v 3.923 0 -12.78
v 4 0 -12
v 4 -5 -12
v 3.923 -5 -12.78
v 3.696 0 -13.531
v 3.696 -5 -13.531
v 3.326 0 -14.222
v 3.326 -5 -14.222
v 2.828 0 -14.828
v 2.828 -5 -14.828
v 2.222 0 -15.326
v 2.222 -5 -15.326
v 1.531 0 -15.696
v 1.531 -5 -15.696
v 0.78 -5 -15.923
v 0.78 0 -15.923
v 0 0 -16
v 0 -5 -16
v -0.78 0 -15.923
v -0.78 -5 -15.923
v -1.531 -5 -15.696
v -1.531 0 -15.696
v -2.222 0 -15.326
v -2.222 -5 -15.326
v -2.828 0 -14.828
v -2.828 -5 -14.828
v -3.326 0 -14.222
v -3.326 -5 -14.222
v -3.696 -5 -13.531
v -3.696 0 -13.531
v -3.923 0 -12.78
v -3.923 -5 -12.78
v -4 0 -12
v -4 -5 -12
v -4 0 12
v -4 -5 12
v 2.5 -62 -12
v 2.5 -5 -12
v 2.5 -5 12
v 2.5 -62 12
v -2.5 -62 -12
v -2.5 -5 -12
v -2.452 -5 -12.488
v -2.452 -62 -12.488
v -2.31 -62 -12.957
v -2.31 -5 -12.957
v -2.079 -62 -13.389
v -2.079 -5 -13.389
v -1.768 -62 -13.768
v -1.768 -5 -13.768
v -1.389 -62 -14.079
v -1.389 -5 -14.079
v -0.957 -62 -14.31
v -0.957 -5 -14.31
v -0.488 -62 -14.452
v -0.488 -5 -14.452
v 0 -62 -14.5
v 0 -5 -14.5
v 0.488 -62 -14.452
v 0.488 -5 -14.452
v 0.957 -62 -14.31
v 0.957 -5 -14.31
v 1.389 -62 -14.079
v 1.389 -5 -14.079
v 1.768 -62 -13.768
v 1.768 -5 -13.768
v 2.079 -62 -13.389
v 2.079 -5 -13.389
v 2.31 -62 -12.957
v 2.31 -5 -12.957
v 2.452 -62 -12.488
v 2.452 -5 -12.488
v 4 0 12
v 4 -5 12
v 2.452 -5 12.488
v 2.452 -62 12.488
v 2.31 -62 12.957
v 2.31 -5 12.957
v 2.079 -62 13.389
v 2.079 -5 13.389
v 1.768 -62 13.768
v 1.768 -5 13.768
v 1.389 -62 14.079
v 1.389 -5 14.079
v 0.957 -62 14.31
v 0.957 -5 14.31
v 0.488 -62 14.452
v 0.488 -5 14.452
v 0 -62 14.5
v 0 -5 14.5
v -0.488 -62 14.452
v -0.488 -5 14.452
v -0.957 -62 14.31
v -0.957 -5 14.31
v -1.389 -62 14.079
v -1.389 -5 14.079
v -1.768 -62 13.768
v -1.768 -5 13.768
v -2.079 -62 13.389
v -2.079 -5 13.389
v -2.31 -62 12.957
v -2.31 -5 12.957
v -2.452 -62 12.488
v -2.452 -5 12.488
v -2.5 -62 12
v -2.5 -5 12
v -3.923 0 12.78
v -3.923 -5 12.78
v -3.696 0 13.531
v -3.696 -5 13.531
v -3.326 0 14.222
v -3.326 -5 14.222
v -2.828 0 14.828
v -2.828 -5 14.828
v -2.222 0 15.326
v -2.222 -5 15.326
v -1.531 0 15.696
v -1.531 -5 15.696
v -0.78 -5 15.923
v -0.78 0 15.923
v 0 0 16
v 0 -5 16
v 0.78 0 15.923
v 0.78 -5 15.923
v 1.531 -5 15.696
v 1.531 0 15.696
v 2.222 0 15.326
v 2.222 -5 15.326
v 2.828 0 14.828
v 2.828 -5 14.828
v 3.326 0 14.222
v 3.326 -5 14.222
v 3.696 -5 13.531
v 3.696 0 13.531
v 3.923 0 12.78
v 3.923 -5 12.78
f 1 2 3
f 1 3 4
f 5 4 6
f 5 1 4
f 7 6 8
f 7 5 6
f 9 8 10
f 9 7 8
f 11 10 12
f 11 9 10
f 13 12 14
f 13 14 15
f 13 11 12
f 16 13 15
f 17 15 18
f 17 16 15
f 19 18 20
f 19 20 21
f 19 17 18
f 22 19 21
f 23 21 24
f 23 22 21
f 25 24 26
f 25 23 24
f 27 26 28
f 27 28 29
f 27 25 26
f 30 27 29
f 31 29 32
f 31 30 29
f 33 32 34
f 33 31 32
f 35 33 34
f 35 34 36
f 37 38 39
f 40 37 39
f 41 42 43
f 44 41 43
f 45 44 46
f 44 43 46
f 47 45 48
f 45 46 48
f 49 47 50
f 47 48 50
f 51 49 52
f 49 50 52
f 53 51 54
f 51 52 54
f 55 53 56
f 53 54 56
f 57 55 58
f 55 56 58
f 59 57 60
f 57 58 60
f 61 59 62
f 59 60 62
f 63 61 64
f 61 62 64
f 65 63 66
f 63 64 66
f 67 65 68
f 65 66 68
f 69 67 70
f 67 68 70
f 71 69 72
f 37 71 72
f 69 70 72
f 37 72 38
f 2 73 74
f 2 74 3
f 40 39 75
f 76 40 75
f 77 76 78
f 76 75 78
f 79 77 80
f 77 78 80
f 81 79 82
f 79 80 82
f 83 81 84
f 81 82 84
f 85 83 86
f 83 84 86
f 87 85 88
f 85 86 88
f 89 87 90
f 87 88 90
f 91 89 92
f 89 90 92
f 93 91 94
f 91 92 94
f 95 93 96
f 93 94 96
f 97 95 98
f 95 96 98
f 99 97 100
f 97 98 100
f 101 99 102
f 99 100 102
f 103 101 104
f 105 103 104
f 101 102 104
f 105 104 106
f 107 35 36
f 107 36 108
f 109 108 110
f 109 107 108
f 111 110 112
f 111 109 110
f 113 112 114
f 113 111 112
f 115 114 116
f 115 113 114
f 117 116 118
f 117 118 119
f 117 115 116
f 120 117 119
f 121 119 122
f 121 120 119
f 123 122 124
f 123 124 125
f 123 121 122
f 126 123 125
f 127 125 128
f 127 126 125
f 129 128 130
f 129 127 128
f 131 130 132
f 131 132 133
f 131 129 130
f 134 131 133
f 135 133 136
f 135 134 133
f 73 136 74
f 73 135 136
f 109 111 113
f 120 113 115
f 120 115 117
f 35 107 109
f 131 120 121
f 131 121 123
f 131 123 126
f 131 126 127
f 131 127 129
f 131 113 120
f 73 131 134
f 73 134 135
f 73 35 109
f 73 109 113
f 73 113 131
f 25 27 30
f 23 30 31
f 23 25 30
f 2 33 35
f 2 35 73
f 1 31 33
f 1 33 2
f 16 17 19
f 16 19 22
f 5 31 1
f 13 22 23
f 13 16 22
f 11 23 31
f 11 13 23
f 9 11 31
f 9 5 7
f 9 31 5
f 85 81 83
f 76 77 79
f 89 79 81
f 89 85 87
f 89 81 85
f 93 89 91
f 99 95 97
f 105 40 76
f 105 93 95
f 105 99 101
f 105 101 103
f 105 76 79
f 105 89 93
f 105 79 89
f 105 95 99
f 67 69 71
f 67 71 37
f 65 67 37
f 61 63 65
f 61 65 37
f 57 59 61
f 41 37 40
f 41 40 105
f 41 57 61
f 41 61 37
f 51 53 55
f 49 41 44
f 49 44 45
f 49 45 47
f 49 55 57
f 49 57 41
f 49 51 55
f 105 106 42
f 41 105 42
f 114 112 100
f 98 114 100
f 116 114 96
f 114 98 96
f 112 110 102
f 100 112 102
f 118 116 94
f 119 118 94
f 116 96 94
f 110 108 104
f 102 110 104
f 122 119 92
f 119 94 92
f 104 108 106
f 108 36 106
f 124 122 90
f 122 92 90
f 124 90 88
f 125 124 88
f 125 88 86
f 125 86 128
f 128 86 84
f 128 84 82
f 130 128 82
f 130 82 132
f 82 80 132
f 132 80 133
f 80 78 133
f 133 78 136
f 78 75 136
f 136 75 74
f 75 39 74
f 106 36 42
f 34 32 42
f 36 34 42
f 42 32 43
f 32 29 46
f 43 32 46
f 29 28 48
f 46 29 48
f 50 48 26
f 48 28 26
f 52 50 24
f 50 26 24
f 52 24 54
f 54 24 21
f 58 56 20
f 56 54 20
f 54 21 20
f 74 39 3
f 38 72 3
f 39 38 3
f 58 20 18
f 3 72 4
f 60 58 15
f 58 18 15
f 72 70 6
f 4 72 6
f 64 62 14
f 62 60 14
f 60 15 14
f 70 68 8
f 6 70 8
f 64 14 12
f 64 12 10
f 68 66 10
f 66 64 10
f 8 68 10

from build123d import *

# Parameters (mm, degrees)
BOSS_EXTRUDE1_DEPTH = 62
BOSS_EXTRUDE2_DEPTH = 5


with BuildPart() as part:
    # Sketch1 → Boss-Extrude1 (new body)
    with BuildSketch(Plane(origin=(0, 0, 0), x_dir=(1, 0, 0), z_dir=(0, 1, 0))):
        with BuildLine():
            Line((-2.5, -12), (-2.5, 12))
            ThreePointArc((-2.5, 12), (0, 14.5), (2.5, 12))
            Line((2.5, 12), (2.5, -12))
            ThreePointArc((2.5, -12), (0, -14.5), (-2.5, -12))
        make_face()
    extrude(amount=-BOSS_EXTRUDE1_DEPTH)

    # Sketch2 → Boss-Extrude2 (add)
    with BuildSketch(Plane(origin=(0, 0, 0), x_dir=(1, 0, 0), z_dir=(0, 1, 0))):
        with BuildLine():
            Line((4, -12), (4, 12))
            ThreePointArc((4, 12), (0, 16), (-4, 12))
            Line((-4, 12), (-4, -12))
            ThreePointArc((-4, -12), (0, -16), (4, -12))
        make_face()
    extrude(amount=-BOSS_EXTRUDE2_DEPTH)


solid = part.part
